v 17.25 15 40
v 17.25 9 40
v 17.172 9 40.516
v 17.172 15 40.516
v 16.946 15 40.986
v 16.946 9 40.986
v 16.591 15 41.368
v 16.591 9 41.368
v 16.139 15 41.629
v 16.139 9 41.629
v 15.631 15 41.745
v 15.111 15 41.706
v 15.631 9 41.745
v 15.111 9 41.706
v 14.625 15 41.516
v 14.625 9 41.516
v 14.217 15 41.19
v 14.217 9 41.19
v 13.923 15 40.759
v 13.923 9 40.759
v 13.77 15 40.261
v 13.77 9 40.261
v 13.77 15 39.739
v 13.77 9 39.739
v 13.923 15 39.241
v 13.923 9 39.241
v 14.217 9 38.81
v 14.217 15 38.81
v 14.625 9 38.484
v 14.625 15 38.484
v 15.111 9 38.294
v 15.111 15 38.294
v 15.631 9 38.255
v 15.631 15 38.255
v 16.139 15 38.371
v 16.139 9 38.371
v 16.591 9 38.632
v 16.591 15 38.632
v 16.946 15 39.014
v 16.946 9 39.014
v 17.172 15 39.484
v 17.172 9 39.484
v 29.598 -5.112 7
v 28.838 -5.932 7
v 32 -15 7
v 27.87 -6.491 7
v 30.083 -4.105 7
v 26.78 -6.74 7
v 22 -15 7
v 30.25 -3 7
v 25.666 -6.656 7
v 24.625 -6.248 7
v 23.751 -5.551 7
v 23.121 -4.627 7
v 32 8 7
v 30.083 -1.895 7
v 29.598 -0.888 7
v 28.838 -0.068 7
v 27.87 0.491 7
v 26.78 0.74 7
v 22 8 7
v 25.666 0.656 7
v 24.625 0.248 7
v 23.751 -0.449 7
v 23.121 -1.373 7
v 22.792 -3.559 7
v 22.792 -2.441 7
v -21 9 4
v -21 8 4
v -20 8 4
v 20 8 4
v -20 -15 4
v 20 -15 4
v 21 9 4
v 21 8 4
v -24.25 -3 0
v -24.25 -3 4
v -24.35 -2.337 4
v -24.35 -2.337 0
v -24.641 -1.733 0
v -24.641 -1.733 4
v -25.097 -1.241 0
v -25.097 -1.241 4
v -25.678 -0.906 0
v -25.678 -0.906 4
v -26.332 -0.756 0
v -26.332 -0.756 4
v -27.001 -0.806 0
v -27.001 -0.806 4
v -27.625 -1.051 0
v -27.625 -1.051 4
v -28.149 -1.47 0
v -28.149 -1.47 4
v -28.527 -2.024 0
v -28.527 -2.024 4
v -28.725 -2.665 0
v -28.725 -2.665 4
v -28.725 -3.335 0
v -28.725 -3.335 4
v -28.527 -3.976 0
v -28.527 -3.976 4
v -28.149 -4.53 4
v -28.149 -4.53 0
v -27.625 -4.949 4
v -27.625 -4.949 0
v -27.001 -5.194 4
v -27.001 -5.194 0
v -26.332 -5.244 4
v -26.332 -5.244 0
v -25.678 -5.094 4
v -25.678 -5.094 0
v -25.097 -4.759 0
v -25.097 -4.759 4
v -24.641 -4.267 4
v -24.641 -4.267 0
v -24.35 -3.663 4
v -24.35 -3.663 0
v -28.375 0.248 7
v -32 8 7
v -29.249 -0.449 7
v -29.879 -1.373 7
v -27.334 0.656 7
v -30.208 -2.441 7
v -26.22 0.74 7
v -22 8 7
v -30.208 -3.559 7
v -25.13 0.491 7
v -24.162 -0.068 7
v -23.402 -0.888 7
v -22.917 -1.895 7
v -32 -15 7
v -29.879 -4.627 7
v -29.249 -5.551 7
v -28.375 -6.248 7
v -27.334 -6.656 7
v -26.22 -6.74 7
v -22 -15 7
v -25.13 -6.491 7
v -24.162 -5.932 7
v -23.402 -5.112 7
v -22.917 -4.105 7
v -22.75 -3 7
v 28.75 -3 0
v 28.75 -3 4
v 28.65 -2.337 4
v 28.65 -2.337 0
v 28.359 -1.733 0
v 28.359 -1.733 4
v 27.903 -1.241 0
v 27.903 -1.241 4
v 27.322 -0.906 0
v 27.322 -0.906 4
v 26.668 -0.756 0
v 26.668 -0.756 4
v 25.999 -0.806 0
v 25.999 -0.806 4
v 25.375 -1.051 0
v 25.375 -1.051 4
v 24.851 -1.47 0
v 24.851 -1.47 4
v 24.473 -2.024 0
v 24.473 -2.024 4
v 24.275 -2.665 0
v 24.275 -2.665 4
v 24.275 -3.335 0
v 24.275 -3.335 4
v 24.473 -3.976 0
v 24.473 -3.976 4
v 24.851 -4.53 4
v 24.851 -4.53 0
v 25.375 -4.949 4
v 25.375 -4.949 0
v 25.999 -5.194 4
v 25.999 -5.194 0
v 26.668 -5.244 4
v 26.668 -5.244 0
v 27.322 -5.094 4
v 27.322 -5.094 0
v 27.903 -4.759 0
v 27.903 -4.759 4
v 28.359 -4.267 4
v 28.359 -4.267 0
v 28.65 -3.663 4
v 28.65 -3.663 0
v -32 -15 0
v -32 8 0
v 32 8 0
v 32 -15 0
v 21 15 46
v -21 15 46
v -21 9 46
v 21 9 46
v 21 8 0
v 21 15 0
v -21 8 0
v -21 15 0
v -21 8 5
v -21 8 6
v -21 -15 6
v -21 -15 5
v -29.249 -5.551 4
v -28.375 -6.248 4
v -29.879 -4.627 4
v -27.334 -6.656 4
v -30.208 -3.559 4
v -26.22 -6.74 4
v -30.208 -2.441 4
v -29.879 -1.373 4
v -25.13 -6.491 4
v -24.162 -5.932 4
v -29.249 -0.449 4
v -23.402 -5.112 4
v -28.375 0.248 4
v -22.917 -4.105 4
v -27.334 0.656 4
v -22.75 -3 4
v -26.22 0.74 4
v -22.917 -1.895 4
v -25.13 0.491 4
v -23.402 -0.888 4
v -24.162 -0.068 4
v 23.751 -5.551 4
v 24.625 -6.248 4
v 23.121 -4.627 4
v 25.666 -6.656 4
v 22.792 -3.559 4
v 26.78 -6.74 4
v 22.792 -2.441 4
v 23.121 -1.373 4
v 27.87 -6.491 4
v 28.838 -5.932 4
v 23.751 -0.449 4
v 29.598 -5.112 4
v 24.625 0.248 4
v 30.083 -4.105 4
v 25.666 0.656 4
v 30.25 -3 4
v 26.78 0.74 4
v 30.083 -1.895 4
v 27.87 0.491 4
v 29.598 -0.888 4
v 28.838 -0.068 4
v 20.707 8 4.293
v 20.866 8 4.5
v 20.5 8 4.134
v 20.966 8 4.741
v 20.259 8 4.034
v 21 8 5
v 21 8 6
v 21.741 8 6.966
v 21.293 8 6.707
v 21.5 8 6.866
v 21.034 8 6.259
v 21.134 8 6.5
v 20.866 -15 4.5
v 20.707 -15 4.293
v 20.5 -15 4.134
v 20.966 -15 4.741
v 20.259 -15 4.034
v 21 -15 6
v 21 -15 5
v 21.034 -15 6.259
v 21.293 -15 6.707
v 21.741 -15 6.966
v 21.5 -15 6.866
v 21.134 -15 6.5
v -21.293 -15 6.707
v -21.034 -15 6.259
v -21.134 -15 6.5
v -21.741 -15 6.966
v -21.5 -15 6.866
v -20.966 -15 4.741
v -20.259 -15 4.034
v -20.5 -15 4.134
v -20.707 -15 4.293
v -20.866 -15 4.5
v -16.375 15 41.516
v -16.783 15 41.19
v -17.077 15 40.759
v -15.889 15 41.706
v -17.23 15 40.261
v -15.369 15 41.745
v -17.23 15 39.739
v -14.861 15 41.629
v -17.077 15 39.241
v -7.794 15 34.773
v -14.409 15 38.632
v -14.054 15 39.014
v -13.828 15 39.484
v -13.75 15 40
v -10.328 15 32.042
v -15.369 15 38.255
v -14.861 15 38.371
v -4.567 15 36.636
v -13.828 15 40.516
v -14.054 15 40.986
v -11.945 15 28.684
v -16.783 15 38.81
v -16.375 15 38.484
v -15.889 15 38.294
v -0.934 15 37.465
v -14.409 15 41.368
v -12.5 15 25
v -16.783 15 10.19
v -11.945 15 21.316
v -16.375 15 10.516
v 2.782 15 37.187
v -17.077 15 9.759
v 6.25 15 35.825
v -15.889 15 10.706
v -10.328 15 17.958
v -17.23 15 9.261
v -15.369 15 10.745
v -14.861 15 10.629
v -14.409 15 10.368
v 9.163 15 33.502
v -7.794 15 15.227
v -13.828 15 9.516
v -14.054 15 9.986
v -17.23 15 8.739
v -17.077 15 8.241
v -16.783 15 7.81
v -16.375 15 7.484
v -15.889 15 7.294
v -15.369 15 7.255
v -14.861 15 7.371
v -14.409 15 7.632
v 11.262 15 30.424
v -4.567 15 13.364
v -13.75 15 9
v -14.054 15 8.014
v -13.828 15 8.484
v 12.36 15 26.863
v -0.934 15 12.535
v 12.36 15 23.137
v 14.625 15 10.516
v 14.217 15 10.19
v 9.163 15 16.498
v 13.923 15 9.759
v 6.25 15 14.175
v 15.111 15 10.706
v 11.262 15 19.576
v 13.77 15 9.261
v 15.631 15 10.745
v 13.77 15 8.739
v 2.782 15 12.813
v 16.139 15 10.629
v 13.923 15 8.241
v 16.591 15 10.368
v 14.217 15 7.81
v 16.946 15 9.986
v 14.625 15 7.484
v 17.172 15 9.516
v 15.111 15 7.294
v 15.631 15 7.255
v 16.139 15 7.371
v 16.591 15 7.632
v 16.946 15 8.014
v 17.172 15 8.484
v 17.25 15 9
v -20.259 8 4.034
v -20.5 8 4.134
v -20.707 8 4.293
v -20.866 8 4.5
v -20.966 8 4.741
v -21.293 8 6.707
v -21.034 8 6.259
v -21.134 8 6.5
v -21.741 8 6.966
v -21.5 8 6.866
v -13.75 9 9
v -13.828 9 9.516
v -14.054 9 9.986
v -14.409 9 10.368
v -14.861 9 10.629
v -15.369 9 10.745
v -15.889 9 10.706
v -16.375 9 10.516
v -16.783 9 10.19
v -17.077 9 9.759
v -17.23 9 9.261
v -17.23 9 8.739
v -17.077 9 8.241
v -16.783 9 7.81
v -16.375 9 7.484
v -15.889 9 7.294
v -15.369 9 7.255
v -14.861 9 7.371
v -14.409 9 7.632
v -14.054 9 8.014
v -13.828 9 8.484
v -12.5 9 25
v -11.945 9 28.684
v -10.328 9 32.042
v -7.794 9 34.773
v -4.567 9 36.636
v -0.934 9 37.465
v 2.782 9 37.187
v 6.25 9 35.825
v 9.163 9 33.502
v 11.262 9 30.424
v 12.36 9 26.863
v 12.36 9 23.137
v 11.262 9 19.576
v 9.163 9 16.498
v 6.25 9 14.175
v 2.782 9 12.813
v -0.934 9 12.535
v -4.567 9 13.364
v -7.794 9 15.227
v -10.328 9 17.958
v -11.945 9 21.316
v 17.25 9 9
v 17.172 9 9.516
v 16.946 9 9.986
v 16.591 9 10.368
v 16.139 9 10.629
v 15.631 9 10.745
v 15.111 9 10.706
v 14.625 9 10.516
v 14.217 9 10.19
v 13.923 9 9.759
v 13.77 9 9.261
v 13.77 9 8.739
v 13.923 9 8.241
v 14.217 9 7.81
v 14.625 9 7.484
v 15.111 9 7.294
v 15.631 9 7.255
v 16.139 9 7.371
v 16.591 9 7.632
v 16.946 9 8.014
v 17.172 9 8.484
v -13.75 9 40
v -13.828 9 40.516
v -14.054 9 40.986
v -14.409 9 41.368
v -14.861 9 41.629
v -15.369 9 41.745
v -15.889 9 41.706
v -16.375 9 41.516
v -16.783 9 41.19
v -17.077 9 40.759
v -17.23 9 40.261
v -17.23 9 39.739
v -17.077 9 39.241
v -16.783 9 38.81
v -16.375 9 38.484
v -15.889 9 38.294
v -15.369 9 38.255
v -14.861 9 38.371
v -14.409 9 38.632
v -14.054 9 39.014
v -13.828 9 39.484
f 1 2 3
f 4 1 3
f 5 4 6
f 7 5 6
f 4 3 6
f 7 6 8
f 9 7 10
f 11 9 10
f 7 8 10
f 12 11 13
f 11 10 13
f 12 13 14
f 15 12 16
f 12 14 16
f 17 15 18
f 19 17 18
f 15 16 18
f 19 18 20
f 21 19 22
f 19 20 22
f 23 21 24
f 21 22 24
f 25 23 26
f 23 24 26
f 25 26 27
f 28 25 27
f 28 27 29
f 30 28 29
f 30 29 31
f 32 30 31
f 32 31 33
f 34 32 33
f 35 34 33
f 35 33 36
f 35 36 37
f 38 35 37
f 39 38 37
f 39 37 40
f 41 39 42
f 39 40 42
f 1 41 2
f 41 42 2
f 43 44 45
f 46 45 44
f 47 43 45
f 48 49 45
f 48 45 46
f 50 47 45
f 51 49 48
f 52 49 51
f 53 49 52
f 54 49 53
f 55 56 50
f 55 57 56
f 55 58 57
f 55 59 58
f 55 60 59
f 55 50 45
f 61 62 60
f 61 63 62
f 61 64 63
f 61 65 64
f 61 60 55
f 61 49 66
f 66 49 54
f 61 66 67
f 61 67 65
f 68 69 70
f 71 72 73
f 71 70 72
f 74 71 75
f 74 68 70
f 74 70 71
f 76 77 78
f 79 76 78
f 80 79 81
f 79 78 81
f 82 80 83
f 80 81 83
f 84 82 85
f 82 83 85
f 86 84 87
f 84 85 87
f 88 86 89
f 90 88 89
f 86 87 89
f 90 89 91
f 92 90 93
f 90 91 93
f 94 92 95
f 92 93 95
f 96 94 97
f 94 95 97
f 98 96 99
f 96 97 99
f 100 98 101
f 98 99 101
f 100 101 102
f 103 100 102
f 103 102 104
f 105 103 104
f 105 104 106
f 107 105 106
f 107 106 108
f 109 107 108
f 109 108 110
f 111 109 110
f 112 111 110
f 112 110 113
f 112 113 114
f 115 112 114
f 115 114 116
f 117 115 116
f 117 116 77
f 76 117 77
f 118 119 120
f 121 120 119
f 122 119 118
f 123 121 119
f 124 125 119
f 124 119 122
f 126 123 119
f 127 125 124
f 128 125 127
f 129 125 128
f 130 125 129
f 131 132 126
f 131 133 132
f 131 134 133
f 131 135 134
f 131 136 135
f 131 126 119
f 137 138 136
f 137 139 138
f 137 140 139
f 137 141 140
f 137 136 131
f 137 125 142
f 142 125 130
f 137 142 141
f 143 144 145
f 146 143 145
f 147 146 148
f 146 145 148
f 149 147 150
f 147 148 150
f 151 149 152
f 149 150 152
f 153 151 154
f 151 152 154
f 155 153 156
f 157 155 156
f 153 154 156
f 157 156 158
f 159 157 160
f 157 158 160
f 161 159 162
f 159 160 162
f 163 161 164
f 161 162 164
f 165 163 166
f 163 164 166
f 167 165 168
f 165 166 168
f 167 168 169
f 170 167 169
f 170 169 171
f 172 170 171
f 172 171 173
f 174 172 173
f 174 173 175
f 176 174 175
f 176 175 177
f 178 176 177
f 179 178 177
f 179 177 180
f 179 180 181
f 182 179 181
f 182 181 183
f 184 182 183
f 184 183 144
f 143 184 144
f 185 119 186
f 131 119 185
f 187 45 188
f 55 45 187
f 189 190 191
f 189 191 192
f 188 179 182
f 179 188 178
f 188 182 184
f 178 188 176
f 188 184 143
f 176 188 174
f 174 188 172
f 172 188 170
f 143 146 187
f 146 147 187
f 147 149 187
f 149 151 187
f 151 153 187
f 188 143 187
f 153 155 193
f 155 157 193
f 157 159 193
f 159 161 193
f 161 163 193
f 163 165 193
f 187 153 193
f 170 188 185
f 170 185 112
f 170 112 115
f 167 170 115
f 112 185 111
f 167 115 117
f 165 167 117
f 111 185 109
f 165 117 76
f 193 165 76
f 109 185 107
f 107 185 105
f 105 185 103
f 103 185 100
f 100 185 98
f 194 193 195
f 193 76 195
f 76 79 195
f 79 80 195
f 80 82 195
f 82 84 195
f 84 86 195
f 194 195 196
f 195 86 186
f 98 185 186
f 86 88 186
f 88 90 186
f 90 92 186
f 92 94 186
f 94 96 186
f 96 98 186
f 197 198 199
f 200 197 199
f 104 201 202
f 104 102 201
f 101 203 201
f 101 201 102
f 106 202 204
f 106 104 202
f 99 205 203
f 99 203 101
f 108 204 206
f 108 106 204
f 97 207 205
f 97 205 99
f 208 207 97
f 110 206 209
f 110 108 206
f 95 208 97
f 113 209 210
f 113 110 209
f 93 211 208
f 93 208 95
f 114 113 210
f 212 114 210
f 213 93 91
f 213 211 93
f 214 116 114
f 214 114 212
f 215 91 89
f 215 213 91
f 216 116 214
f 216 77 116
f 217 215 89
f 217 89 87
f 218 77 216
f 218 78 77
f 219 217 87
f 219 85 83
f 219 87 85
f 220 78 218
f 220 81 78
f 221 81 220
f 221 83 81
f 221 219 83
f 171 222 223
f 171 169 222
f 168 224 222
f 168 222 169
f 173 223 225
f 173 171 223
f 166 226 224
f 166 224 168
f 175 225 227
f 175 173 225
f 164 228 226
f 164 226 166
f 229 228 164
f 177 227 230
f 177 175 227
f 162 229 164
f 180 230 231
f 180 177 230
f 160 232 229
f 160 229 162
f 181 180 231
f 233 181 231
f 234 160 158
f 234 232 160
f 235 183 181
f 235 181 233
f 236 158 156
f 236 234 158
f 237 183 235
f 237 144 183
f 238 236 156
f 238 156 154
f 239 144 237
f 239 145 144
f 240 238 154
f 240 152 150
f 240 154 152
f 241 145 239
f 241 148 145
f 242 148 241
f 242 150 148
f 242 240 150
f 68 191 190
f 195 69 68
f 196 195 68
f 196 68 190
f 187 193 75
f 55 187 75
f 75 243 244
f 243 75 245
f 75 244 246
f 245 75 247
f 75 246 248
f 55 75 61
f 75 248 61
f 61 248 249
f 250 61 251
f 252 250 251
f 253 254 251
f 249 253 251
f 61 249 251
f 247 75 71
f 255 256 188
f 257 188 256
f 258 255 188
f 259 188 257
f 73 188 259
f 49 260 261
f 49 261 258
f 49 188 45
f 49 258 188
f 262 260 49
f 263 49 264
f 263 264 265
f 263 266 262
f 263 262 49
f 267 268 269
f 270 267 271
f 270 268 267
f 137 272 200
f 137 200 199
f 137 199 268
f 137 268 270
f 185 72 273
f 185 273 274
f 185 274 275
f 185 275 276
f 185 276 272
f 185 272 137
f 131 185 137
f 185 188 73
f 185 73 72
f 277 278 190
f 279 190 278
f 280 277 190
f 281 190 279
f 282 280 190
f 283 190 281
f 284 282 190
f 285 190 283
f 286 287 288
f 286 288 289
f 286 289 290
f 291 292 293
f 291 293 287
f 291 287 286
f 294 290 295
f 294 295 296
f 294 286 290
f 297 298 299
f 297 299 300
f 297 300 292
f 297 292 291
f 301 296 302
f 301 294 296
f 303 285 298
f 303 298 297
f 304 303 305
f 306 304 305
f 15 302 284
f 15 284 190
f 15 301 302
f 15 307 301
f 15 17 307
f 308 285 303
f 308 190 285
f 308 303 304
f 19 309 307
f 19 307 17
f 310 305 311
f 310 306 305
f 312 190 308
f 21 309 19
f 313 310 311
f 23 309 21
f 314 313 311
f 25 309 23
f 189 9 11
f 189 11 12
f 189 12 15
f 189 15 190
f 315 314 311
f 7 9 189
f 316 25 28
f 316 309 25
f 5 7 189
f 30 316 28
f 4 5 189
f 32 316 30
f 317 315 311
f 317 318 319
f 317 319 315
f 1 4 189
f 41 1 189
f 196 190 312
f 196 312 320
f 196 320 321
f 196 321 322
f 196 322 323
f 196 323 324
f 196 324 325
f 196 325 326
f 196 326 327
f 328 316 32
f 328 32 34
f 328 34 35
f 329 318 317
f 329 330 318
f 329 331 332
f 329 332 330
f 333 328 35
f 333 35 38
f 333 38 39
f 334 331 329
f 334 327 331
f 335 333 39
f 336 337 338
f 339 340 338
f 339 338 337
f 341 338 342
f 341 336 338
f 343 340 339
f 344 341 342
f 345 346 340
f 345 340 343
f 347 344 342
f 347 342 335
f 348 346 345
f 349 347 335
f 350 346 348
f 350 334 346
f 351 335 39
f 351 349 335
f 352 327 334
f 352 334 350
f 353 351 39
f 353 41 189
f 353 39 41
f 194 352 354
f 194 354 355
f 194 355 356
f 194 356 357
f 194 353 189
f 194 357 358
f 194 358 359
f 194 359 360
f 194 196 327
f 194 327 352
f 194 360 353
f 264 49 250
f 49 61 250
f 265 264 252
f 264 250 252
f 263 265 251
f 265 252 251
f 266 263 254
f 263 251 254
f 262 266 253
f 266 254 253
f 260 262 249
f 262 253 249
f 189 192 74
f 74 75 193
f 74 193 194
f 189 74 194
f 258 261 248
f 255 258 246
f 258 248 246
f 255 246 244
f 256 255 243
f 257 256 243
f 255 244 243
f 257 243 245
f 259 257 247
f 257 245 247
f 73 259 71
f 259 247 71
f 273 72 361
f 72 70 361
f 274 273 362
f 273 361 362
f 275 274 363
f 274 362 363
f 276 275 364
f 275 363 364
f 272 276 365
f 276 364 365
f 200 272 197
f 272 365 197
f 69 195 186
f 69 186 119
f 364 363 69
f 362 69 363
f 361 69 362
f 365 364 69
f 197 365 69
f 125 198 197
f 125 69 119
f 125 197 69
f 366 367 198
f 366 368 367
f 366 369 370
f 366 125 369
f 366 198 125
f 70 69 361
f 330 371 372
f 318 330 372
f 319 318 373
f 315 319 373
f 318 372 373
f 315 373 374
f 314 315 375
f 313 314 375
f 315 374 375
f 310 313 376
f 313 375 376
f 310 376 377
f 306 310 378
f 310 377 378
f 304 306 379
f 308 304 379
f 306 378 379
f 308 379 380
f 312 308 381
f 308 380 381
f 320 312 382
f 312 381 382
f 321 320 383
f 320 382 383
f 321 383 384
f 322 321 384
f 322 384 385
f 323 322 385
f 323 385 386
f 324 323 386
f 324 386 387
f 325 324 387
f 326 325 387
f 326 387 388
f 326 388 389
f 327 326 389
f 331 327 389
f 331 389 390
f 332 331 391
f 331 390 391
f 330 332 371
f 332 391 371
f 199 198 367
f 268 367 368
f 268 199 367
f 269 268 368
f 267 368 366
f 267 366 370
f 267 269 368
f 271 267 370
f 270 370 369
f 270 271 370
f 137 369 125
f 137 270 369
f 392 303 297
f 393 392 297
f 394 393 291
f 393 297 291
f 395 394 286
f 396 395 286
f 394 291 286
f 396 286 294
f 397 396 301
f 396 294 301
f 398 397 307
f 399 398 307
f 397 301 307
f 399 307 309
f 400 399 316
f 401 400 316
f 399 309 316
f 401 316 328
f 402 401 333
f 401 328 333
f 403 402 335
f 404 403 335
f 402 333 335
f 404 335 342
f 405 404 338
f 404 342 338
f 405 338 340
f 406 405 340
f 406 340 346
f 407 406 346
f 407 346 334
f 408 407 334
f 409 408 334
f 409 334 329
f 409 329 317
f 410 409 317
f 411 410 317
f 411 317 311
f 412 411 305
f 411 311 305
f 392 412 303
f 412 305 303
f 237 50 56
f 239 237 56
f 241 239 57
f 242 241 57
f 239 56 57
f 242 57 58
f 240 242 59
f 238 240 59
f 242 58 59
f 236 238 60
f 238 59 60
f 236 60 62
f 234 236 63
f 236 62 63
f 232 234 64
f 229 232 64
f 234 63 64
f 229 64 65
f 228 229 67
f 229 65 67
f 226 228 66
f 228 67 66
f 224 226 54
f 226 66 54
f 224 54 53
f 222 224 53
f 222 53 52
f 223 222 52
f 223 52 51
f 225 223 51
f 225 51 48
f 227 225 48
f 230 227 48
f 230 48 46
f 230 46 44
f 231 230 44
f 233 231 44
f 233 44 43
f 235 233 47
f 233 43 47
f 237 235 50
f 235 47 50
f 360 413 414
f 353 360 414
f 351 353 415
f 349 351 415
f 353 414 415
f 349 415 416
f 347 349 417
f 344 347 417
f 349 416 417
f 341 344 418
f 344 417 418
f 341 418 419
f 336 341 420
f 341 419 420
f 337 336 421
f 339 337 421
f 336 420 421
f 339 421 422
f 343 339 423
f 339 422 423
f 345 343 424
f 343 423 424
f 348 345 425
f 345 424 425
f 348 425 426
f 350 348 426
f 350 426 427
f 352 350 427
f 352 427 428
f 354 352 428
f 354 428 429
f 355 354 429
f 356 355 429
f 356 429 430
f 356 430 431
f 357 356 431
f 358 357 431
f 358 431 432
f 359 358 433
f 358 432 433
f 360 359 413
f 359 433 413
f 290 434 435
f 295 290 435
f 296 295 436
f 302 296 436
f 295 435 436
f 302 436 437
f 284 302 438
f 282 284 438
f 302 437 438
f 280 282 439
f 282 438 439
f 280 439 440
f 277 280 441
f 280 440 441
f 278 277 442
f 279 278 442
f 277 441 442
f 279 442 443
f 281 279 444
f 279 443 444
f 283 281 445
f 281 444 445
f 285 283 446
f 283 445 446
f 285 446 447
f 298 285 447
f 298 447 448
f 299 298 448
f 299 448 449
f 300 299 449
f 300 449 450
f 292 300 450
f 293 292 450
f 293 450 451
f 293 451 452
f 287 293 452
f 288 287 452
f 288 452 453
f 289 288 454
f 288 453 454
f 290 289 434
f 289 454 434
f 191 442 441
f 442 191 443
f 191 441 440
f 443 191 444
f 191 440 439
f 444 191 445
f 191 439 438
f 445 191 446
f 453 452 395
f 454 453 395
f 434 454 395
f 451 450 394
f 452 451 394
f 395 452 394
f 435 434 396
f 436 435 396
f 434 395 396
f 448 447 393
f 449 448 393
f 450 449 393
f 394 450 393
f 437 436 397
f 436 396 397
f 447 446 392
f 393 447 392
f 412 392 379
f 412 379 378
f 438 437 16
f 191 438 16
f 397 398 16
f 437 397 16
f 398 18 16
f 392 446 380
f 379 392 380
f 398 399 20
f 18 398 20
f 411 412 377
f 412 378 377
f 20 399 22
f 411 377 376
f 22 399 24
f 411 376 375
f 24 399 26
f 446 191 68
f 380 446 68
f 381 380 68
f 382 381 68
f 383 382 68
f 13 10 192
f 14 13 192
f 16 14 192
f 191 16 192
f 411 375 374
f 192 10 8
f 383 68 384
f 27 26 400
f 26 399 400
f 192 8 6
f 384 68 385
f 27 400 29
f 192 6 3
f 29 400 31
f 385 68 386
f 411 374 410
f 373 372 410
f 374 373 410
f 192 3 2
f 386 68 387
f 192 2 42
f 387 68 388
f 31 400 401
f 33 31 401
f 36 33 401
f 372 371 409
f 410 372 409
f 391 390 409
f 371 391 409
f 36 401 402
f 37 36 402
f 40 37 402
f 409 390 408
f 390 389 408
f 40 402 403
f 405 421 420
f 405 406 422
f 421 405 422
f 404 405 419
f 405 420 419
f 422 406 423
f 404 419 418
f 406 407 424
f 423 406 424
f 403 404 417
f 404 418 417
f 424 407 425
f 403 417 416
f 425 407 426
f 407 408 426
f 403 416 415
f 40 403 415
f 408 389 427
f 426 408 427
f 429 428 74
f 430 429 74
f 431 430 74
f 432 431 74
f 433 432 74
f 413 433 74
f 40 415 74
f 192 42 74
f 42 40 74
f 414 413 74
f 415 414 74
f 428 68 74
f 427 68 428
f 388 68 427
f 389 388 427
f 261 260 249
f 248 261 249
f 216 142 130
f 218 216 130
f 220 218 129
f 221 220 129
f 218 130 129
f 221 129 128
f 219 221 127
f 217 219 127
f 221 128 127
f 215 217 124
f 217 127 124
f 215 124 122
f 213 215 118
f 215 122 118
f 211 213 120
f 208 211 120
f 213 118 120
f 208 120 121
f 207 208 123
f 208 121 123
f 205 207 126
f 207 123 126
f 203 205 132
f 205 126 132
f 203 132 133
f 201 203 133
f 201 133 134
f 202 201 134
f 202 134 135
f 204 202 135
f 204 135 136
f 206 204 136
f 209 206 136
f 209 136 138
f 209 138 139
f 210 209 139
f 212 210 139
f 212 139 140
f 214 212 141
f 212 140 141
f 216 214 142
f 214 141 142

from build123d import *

# Parameters (mm, degrees)
SKETCH_W        = 42
SKETCH_H        = 30
PAD_DEPTH       = 4
SKETCH001_W     = 42
SKETCH001_H     = 6
PAD001_DEPTH    = 42
SKETCH002_R     = 12.5
POCKET_DEPTH    = 6
SKETCH003_R     = 1.75
POCKET001_DEPTH = 6
SKETCH004_W     = 23
SKETCH004_H     = 7
PAD002_DEPTH    = 11
SKETCH005_W     = 23
SKETCH005_H     = 7
PAD003_DEPTH    = 11
SKETCH006_R     = 2.25
POCKET002_DEPTH = 10
SKETCH007_R     = 3.75
POCKET003_DEPTH = 3
FILLET_R        = 1


with BuildPart() as part:
    # Sketch → Pad (new body)
    with BuildSketch(Plane.XY):
        Rectangle(SKETCH_W, SKETCH_H)
    extrude(amount=PAD_DEPTH)

    # Sketch001 (on Face6 of Pad) → Pad001 (join)
    with BuildSketch(Plane.XY.offset(4)):
        with Locations((0, 12)):
            Rectangle(SKETCH001_W, SKETCH001_H)
    extrude(amount=PAD001_DEPTH)

    # Sketch002 (on Face7 of Pad001) → Pocket (cut)
    with BuildSketch(Plane(origin=(0, 15, 0), x_dir=(-1, 0, 0), z_dir=(0, 1, 0))):
        with Locations((0, 25)):
            Circle(SKETCH002_R)
    extrude(amount=-POCKET_DEPTH, mode=Mode.SUBTRACT)

    # Sketch003 (on Face6 of Pocket) → Pocket001 (cut)
    with BuildSketch(Plane.XZ.offset(-9)):
        with Locations((15.5, 9)):
            Circle(SKETCH003_R)
        with Locations((-15.5, 9)):
            Circle(SKETCH003_R)
        with Locations((15.5, 40)):
            Circle(SKETCH003_R)
        with Locations((-15.5, 40)):
            Circle(SKETCH003_R)
    extrude(amount=-POCKET001_DEPTH, mode=Mode.SUBTRACT)

    # Sketch004 (on Face2 of Pocket001) → Pad002 (join)
    with BuildSketch(Plane(origin=(-21, 0, 0), x_dir=(0, -1, 0), z_dir=(-1, 0, 0))):
        with Locations((3.5, 3.5)):
            Rectangle(SKETCH004_W, SKETCH004_H)
    extrude(amount=PAD002_DEPTH)

    # Sketch005 (on Face1 of Pad002) → Pad003 (join)
    with BuildSketch(Plane.YZ.offset(21)):
        with Locations((-3.5, 3.5)):
            Rectangle(SKETCH005_W, SKETCH005_H)
    extrude(amount=PAD003_DEPTH)

    # Sketch006 (on Face19 of Pad003) → Pocket002 (cut)
    with BuildSketch(Plane.XY.offset(7)):
        with Locations((-26.5, -3)):
            Circle(SKETCH006_R)
        with Locations((26.5, -3)):
            Circle(SKETCH006_R)
    extrude(amount=-POCKET002_DEPTH, mode=Mode.SUBTRACT)

    # Sketch007 (on Face23 of Pocket002) → Pocket003 (cut)
    with BuildSketch(Plane.XY.offset(7)):
        with Locations((-26.5, -3)):
            Circle(SKETCH007_R)
        with Locations((26.5, -3)):
            Circle(SKETCH007_R)
    extrude(amount=-POCKET003_DEPTH, mode=Mode.SUBTRACT)

    # Fillet
    fillet_edges = [part.edges().sort_by_distance(p)[0] for p in [
        (-21, -3.5, 7),
        (21, -3.5, 7),
        (21, -3.5, 4),
        (-21, -3.5, 4),
    ]]
    fillet(fillet_edges, radius=FILLET_R)


solid = part.part
